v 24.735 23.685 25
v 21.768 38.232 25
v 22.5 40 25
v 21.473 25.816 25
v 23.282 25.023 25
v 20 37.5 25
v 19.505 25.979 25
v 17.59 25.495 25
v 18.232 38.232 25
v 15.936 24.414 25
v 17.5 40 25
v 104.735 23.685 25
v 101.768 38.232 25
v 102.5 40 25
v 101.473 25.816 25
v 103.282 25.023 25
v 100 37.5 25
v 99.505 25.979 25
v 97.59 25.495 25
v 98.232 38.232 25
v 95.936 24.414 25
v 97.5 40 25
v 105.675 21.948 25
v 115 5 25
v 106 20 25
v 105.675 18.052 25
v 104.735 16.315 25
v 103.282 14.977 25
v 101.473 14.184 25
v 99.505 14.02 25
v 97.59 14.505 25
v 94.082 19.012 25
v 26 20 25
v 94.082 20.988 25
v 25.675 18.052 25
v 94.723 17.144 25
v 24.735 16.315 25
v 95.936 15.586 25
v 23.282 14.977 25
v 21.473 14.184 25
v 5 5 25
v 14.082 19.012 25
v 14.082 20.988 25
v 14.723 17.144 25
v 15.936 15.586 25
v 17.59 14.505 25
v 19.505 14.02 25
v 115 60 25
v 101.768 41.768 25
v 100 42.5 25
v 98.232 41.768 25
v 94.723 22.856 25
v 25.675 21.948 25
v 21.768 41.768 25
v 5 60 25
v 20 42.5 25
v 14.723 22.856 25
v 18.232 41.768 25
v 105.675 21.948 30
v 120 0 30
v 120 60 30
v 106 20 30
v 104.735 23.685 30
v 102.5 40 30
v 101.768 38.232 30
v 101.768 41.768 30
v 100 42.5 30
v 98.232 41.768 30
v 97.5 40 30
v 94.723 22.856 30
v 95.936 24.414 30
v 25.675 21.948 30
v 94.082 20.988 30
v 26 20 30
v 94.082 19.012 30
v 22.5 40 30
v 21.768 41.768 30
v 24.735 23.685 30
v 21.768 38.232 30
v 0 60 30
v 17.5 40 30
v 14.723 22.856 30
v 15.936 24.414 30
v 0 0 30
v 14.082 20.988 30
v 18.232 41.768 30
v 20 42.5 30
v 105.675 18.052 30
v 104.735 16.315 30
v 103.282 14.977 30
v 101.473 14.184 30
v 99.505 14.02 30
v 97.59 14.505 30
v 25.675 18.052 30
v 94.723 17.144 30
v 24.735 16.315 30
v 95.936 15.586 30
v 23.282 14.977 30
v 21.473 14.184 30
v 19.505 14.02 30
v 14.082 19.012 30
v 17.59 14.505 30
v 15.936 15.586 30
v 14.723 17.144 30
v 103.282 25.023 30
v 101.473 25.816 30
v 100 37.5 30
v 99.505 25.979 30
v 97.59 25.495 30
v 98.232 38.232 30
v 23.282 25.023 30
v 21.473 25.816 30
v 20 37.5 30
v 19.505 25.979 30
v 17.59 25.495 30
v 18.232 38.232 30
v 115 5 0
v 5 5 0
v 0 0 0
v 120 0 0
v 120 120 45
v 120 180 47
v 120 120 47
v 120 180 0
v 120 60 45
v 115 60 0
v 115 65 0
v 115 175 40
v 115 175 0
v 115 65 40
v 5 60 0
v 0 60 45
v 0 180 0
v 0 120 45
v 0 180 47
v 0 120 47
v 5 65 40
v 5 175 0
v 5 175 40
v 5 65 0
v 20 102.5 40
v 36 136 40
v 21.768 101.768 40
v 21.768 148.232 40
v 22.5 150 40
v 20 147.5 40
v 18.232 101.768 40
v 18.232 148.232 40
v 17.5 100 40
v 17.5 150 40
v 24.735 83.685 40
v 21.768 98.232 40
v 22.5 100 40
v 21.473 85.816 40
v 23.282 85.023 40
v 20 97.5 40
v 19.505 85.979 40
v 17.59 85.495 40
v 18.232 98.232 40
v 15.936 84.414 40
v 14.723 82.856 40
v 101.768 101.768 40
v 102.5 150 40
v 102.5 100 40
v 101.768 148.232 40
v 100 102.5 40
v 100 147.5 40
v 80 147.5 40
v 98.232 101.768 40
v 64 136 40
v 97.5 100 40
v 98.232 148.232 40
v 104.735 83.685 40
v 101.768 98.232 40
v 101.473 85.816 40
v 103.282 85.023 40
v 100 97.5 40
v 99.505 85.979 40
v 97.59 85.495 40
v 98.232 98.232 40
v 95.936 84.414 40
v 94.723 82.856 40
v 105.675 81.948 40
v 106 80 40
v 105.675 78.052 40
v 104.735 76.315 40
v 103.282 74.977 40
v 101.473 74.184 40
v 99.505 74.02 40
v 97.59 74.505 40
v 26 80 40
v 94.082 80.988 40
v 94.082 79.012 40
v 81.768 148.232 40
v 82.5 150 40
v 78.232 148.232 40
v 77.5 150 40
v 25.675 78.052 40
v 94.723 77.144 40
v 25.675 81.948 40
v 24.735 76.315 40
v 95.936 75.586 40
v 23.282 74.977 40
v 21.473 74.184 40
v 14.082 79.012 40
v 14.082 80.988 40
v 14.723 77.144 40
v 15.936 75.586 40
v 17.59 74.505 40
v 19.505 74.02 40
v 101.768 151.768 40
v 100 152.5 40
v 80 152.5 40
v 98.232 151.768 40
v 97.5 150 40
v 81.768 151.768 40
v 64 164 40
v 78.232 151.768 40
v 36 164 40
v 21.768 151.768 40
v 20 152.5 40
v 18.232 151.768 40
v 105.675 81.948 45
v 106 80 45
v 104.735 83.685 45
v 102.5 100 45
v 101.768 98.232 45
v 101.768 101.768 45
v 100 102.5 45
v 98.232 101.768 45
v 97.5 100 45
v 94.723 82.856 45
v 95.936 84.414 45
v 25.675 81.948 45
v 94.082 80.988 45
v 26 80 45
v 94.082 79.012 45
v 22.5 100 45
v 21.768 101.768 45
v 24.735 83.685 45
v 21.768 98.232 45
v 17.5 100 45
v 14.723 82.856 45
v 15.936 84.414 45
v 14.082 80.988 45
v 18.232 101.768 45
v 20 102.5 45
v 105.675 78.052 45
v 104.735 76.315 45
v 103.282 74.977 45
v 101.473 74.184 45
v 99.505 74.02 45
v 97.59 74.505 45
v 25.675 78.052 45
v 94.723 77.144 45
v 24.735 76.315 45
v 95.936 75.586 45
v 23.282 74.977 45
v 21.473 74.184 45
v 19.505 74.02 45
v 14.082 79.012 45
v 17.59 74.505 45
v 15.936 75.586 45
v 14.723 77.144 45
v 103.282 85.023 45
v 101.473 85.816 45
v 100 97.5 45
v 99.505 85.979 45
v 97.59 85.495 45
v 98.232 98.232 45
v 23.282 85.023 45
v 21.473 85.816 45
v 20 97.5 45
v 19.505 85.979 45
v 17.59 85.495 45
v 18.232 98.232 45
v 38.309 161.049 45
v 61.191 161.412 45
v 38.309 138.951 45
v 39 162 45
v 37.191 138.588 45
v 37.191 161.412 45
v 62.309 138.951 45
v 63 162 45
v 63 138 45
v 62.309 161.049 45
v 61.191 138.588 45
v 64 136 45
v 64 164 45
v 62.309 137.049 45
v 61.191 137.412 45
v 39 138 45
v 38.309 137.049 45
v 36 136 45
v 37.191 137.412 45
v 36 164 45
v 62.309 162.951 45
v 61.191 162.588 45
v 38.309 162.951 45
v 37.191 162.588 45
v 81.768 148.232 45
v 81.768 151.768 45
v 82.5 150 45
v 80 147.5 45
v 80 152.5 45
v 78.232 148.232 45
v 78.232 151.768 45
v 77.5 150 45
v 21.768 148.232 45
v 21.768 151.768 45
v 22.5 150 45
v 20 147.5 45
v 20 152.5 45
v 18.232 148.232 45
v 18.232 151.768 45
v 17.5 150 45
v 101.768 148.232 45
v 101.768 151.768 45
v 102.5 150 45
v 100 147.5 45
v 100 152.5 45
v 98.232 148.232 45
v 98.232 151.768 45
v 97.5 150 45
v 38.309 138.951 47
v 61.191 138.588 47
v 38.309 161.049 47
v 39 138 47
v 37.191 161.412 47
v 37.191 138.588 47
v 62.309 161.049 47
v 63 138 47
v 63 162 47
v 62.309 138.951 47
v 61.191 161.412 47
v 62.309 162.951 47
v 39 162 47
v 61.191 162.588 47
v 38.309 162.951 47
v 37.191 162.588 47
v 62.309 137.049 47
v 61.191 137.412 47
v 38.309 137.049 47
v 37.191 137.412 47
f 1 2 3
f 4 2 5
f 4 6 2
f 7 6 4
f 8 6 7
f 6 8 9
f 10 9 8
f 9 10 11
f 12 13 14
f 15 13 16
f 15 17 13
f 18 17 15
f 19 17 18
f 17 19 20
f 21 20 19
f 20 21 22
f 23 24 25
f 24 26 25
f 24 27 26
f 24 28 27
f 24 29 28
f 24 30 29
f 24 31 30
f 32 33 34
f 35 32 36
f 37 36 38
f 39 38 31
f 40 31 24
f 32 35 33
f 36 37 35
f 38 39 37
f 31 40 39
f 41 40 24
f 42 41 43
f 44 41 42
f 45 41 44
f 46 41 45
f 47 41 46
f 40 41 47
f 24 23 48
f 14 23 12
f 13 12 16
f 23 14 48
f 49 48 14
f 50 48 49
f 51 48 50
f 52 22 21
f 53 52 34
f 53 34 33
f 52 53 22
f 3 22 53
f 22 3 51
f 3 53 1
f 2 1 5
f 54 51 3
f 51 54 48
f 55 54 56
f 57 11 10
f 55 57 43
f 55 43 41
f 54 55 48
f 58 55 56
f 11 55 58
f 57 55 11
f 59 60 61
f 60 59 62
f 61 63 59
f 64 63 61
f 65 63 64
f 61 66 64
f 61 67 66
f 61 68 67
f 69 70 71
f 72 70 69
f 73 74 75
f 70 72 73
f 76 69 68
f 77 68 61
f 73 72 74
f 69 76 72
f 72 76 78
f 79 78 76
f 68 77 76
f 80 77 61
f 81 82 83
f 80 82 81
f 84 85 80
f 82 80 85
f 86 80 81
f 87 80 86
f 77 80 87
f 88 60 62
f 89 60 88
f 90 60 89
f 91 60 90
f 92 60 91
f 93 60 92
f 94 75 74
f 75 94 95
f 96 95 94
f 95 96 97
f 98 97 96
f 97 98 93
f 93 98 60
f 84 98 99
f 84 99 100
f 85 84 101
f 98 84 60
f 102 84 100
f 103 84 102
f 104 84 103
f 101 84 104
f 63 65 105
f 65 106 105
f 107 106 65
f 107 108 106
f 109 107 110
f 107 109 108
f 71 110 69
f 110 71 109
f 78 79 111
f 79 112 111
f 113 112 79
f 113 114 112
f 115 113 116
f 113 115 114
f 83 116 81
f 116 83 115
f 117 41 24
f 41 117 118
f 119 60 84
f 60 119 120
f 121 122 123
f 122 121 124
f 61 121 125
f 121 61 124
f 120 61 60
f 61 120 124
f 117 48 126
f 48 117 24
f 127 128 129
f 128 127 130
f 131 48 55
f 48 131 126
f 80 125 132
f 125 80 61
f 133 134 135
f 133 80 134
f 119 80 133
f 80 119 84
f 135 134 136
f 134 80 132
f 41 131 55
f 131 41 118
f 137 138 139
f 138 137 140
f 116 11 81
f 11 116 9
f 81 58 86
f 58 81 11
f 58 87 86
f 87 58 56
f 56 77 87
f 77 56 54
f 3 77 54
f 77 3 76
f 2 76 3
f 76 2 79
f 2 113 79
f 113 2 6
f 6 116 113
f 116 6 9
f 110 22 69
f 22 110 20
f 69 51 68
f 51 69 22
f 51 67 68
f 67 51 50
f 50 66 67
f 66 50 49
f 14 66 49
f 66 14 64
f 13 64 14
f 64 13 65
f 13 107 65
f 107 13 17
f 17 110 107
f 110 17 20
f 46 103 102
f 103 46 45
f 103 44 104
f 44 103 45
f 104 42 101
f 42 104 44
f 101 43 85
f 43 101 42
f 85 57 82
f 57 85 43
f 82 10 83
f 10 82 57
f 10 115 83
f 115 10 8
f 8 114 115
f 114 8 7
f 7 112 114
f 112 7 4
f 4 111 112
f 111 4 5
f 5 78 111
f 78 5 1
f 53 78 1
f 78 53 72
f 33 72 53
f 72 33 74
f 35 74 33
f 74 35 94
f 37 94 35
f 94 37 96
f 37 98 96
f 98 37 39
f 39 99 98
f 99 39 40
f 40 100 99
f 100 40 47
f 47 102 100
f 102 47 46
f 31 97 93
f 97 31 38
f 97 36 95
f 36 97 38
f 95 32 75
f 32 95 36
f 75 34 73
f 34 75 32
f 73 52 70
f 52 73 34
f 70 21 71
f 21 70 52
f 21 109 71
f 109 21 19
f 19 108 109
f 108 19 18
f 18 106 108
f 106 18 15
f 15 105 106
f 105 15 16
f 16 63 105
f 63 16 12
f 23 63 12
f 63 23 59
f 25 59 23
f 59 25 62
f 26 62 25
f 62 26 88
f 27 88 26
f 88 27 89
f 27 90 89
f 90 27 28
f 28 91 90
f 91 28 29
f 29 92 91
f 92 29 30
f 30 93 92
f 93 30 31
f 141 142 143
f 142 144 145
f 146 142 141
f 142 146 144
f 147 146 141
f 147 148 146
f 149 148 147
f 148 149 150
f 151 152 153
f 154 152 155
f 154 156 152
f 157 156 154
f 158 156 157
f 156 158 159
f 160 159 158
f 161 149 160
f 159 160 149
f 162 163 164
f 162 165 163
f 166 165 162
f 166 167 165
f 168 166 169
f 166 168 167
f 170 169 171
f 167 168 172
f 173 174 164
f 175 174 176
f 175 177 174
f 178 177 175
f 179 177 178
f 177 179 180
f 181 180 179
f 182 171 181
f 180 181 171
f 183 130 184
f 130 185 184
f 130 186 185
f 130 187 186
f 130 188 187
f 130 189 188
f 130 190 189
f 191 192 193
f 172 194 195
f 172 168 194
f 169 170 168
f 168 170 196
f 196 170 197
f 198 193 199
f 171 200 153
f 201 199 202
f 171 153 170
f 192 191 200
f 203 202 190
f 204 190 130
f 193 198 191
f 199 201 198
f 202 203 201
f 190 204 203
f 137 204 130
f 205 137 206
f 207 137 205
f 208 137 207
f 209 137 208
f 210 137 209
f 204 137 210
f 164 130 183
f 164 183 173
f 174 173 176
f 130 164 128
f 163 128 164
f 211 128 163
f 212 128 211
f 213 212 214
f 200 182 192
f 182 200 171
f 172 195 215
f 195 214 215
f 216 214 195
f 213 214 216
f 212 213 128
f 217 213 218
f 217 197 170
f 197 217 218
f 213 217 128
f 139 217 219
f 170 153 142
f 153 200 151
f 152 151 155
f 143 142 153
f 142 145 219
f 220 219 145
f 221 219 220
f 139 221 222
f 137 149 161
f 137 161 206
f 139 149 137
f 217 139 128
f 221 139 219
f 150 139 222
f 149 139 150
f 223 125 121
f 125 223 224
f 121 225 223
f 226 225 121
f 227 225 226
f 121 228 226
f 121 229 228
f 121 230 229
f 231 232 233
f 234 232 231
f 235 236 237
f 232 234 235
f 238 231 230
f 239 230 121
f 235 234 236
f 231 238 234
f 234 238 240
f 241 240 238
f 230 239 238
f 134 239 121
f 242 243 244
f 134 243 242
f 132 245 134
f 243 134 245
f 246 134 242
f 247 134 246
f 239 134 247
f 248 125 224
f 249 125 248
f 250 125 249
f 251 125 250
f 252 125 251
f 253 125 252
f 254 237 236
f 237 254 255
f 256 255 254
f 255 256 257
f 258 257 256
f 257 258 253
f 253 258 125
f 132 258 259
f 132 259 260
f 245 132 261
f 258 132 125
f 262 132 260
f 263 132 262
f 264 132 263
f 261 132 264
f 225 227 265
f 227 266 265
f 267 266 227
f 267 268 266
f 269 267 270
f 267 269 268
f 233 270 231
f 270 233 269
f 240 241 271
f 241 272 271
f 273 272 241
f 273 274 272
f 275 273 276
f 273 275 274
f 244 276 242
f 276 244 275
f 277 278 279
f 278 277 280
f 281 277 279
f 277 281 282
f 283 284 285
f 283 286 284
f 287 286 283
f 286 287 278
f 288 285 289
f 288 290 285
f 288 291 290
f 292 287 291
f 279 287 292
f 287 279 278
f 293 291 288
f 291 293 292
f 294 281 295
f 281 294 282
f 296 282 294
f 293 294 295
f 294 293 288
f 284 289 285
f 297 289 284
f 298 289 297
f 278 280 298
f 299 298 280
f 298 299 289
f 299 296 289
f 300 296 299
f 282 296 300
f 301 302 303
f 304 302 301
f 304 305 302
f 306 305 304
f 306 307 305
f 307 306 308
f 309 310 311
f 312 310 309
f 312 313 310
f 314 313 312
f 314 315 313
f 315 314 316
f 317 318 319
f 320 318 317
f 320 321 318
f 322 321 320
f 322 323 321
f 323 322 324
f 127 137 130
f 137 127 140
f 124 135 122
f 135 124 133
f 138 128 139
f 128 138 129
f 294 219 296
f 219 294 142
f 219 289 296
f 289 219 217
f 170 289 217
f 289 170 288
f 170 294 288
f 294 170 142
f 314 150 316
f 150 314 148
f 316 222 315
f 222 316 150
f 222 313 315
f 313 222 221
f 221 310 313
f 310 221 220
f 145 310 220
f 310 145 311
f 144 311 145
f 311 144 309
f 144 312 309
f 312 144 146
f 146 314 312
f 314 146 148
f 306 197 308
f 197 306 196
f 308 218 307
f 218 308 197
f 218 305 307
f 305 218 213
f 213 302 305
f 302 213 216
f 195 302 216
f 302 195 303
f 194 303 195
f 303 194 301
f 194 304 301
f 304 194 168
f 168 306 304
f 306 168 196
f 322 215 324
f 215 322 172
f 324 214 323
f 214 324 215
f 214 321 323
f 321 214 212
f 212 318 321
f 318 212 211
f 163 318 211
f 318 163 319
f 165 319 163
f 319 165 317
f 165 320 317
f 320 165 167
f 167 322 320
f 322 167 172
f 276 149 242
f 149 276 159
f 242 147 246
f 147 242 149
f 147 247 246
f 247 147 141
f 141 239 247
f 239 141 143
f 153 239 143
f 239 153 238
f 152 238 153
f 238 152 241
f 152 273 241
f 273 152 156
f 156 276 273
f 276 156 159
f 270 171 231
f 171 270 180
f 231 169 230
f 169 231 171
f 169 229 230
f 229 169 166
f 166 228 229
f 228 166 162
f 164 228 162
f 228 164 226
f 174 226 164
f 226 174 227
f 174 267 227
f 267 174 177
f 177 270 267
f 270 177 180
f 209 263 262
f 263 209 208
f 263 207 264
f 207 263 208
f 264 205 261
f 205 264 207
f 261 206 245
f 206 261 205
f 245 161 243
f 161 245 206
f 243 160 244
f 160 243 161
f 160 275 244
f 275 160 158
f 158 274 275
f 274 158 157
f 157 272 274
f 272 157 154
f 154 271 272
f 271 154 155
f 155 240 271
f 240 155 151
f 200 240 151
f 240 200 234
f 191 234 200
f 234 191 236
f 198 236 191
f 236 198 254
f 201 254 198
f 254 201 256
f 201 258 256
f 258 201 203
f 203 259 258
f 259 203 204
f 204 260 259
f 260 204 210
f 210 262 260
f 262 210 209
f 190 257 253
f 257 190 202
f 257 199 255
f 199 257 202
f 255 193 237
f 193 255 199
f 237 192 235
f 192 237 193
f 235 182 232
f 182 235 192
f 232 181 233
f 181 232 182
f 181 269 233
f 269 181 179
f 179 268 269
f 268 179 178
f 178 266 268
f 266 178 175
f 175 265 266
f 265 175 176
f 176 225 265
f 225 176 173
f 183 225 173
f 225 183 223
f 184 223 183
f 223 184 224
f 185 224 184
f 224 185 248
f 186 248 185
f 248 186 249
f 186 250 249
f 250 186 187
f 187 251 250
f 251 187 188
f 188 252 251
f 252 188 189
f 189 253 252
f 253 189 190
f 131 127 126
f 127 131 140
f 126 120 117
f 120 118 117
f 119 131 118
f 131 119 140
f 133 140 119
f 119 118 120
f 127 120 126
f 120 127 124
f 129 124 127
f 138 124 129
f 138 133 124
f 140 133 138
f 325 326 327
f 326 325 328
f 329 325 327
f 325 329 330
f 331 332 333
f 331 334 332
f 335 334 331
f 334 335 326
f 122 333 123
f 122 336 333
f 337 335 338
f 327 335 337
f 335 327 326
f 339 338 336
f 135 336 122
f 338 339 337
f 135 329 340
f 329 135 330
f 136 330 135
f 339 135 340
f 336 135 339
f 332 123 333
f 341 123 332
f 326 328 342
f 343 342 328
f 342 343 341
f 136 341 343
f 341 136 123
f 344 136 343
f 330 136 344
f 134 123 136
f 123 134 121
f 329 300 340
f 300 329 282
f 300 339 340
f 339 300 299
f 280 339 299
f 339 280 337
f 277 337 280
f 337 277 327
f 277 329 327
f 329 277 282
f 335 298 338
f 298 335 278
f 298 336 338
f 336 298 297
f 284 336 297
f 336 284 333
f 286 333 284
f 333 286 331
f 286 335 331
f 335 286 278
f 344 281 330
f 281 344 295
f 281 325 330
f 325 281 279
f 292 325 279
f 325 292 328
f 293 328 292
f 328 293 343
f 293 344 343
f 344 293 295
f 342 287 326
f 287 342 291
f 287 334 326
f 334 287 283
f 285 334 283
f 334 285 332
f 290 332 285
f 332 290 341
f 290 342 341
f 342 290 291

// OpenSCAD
// file: footswitch.scad
module contact()
{
    rotate([90,0,0]) union()
    {
        difference()
        {
            union() linear_extrude(height =1,center=true)
            {
                square([5,3 ]);
                translate([5,5/2]) circle(d=5);
            }
            translate([5,5/2]) cylinder(d=2,h=2,center=true);
        }    
     }
 }

module footswitch()
 {
    translate([-15/2,-17/2,0]) cube([15,17,20]);
    translate([0,0,20]) cylinder(d1=14,d2=10,h=2);
    translate([0,0,10]) cylinder(d=12,h=12+10);
    translate([0,0,20+12]) cylinder(d1=12,d2=10,h=1);
    translate([0,0,10+13]) cylinder(d=8,h=5+10);
    translate ([0,0,20+13+5]) cylinder(d=10,h=5);
     
    mirror()
    {
        translate([7,-8,0]) contact();
        translate([7,0,0]) contact();
        translate([7,8,0]) contact();
    }
    {
        translate([7,-8,0]) contact();
        translate([7,0,0]) contact();
        translate([7,8,0]) contact();
    }
}

footswitch();
// main file
use <footswitch.scad>;

fsHole=12;//diameter
ledHole=5;//diameter

thickness=5;

//screen_size_x=26;
//screen_size_y=19;
screen_size_x =28;
screen_size_y =28;

pb_size_x = 120;
pb_size_y = 180;
pb_size_z = 45;

low_step_height= 25;
high_step_height= low_step_height +15;

module high_top()
linear_extrude(height=thickness) 
{
    color("blue") translate([0,60])difference()
    {
        {
            square([pb_size_x,60]);
        }
        {
            translate([20,20]) circle(d=fsHole);
            translate([pb_size_x-20,20]) circle(d=fsHole);
            translate([20,60-20]) circle(d=ledHole);
            translate([pb_size_x-20,60-20]) circle(d=ledHole); 
            translate([0,30-(20/2)]) square([thickness,20]); //left
            translate([pb_size_x-thickness,30-(20/2)]) square([thickness,20]); //right
            translate([(pb_size_x/2)-(pb_size_x/6),0]) square([pb_size_x/3,thickness]) ;       
        }
    }
    translate([0,60+60]) difference()
    {
        {
            square([pb_size_x,60]);
        }
        {
             //screen hole
            translate([pb_size_x/2 -10 ,60-30,2.5]) square([screen_size_x,screen_size_y],center=true);
            translate([pb_size_x/2 - 40,60-30,2.5]) circle(d=5,center=true);
            translate([pb_size_x/2 + 20,60-30,2.5]) circle(d=5,center=true);
            translate([pb_size_x/2 +40,60-30,2.5]) circle(d=5,center=true);
            translate([0,30-(20/2)]) square([thickness,20]); //left
            translate([pb_size_x-thickness,30-(20/2)]) square([thickness,20]); //right
            translate([(pb_size_x/2)-(pb_size_x/6),60-thickness]) square([pb_size_x/3,thickness]);
        }
    }
}

module low_top() //top of low step
{
    linear_extrude(height=thickness) difference()
    {
        {
            square([pb_size_x,60]);
        }
        {
            translate([20,20]) circle(d=fsHole);
            translate([pb_size_x-20,20]) circle(d=fsHole);
            translate([20,60-20]) circle(d=ledHole);
            translate([pb_size_x-20,60-20]) circle(d=ledHole); 
            //finger hole
            translate([0,30-(20/2)]) square([thickness,20]); //left
            translate([pb_size_x-thickness,30-(20/2)]) square([thickness,20]); //right
            translate([(pb_size_x/2)-(pb_size_x/6),0]) square([pb_size_x/3,thickness]);
        }
    }
}
 
module plastic_cover()
{
    linear_extrude(height=2) difference()
    {
       {
           square([pb_size_x,60]);
       }
       { 
           translate([pb_size_x/2 -10 ,60-30])
           {
               translate([2-screen_size_x/2,2-screen_size_y/2]) circle(d=2);
               translate([2-screen_size_x/2,screen_size_y/2-2]) circle(d=2);
               translate([screen_size_x/2-2,2-screen_size_y/2]) circle(d=2);
               translate([screen_size_x/2-2,screen_size_y/2-2]) circle(d=2);
           }
       }
   }
}

module low_front()
{
    linear_extrude(height=thickness) 
    {
        translate([thickness,0]) square([pb_size_x-2*thickness, low_step_height]);
        translate([(pb_size_x/2)-(pb_size_x/6),low_step_height]) square([pb_size_x/3,thickness]);
        translate([0,low_step_height/3]) square([thickness, low_step_height/3]);
        translate([pb_size_x-thickness,low_step_height/3]) square([thickness, low_step_height/3]);   
    }
}

module high_front()
{
    linear_extrude(height=thickness) union()
    {
        translate([thickness,0]) square([pb_size_x-2*thickness,high_step_height]);
        //translate([(pb_size_x/2)-(40/2),high_step_height]) square([40,thickness]);
        translate([0,low_step_height/3]) square([thickness, low_step_height/3]);
        translate([pb_size_x-thickness,low_step_height/3]) square([thickness, low_step_height/3]);
        translate([(pb_size_x/2)-(pb_size_x/6),high_step_height]) square([pb_size_x/3,thickness]);
    }
}

module rear()
{
    linear_extrude(height=thickness)
    {
        translate([5,0]) square([pb_size_x-2*thickness,high_step_height]);
        translate([0,high_step_height/3]) square([thickness, high_step_height/3]);
        translate([pb_size_x-thickness,high_step_height/3]) square([thickness, high_step_height/3]); 
        translate([(pb_size_x/2)-(pb_size_x/6),high_step_height]) square([pb_size_x/3,thickness]);
    }
      
}

module left()
{
    linear_extrude(height=thickness) difference()
    {
        union(){
            square([low_step_height,60]);
            translate([0,60]) square([high_step_height,pb_size_y-60]);
            //finger
            translate([low_step_height,30-(20/2)]) square([thickness,20]);
            translate([high_step_height,60+30-(20/2)]) square([thickness,20]);
            translate([high_step_height,60+60+30-(20/2)]) square([thickness,20]);
        }
        {
            translate([low_step_height/3,0]) square([low_step_height/3,thickness]);
            translate([low_step_height/3,60]) square([low_step_height/3,thickness]);
            translate([high_step_height/3,pb_size_y-thickness]) square([high_step_height/3, thickness,]);
        }
    }
}

module right()
{
    linear_extrude(height=thickness) difference()
    {
        union(){
            square([low_step_height,60]);
            translate([0,60]) square([high_step_height,pb_size_y-60]);
            //finger
            translate([low_step_height,30-(20/2)]) square([thickness,20]);
            translate([high_step_height,60+30-(20/2)]) square([thickness,20]);
            translate([high_step_height,60+60+30-(20/2)]) square([thickness,20]);
        }
        {
            translate([low_step_height/3,0]) square([low_step_height/3,thickness]);
            translate([low_step_height/3,60]) square([low_step_height/3,thickness]);
            translate([high_step_height/3,pb_size_y-thickness]) square([high_step_height/3, thickness,]);
        }
    }
}

//translate([-pb_size_x/2,-pb_size_y/2])
{
    //color("red",0.5) cube([pb_size_x,pb_size_y,pb_size_z]);
    color("blue",alpha=0.2) translate([0,0,low_step_height]) low_top();
    translate([0,0,high_step_height])  high_top();
    
    translate([0,thickness,0]) rotate([90,0,0]) low_front();
    color("green") translate([0,60+thickness,0]) rotate([90,0,0]) high_front();
    color("green") translate([0,pb_size_y,0]) rotate([90,0,0]) rear();
    
    color("red",alpha=0.5) translate([thickness,0,0]) rotate([0,-90,0]) left();
    color("red",alpha=0.5) translate([pb_size_x,0,0]) rotate([0,-90,0]) right();
    
    color([0.8,0.8,0.8,0.3]) translate([0,120,high_step_height+thickness]) plastic_cover();
    
    

}

%translate([20,20,0]) footswitch();
